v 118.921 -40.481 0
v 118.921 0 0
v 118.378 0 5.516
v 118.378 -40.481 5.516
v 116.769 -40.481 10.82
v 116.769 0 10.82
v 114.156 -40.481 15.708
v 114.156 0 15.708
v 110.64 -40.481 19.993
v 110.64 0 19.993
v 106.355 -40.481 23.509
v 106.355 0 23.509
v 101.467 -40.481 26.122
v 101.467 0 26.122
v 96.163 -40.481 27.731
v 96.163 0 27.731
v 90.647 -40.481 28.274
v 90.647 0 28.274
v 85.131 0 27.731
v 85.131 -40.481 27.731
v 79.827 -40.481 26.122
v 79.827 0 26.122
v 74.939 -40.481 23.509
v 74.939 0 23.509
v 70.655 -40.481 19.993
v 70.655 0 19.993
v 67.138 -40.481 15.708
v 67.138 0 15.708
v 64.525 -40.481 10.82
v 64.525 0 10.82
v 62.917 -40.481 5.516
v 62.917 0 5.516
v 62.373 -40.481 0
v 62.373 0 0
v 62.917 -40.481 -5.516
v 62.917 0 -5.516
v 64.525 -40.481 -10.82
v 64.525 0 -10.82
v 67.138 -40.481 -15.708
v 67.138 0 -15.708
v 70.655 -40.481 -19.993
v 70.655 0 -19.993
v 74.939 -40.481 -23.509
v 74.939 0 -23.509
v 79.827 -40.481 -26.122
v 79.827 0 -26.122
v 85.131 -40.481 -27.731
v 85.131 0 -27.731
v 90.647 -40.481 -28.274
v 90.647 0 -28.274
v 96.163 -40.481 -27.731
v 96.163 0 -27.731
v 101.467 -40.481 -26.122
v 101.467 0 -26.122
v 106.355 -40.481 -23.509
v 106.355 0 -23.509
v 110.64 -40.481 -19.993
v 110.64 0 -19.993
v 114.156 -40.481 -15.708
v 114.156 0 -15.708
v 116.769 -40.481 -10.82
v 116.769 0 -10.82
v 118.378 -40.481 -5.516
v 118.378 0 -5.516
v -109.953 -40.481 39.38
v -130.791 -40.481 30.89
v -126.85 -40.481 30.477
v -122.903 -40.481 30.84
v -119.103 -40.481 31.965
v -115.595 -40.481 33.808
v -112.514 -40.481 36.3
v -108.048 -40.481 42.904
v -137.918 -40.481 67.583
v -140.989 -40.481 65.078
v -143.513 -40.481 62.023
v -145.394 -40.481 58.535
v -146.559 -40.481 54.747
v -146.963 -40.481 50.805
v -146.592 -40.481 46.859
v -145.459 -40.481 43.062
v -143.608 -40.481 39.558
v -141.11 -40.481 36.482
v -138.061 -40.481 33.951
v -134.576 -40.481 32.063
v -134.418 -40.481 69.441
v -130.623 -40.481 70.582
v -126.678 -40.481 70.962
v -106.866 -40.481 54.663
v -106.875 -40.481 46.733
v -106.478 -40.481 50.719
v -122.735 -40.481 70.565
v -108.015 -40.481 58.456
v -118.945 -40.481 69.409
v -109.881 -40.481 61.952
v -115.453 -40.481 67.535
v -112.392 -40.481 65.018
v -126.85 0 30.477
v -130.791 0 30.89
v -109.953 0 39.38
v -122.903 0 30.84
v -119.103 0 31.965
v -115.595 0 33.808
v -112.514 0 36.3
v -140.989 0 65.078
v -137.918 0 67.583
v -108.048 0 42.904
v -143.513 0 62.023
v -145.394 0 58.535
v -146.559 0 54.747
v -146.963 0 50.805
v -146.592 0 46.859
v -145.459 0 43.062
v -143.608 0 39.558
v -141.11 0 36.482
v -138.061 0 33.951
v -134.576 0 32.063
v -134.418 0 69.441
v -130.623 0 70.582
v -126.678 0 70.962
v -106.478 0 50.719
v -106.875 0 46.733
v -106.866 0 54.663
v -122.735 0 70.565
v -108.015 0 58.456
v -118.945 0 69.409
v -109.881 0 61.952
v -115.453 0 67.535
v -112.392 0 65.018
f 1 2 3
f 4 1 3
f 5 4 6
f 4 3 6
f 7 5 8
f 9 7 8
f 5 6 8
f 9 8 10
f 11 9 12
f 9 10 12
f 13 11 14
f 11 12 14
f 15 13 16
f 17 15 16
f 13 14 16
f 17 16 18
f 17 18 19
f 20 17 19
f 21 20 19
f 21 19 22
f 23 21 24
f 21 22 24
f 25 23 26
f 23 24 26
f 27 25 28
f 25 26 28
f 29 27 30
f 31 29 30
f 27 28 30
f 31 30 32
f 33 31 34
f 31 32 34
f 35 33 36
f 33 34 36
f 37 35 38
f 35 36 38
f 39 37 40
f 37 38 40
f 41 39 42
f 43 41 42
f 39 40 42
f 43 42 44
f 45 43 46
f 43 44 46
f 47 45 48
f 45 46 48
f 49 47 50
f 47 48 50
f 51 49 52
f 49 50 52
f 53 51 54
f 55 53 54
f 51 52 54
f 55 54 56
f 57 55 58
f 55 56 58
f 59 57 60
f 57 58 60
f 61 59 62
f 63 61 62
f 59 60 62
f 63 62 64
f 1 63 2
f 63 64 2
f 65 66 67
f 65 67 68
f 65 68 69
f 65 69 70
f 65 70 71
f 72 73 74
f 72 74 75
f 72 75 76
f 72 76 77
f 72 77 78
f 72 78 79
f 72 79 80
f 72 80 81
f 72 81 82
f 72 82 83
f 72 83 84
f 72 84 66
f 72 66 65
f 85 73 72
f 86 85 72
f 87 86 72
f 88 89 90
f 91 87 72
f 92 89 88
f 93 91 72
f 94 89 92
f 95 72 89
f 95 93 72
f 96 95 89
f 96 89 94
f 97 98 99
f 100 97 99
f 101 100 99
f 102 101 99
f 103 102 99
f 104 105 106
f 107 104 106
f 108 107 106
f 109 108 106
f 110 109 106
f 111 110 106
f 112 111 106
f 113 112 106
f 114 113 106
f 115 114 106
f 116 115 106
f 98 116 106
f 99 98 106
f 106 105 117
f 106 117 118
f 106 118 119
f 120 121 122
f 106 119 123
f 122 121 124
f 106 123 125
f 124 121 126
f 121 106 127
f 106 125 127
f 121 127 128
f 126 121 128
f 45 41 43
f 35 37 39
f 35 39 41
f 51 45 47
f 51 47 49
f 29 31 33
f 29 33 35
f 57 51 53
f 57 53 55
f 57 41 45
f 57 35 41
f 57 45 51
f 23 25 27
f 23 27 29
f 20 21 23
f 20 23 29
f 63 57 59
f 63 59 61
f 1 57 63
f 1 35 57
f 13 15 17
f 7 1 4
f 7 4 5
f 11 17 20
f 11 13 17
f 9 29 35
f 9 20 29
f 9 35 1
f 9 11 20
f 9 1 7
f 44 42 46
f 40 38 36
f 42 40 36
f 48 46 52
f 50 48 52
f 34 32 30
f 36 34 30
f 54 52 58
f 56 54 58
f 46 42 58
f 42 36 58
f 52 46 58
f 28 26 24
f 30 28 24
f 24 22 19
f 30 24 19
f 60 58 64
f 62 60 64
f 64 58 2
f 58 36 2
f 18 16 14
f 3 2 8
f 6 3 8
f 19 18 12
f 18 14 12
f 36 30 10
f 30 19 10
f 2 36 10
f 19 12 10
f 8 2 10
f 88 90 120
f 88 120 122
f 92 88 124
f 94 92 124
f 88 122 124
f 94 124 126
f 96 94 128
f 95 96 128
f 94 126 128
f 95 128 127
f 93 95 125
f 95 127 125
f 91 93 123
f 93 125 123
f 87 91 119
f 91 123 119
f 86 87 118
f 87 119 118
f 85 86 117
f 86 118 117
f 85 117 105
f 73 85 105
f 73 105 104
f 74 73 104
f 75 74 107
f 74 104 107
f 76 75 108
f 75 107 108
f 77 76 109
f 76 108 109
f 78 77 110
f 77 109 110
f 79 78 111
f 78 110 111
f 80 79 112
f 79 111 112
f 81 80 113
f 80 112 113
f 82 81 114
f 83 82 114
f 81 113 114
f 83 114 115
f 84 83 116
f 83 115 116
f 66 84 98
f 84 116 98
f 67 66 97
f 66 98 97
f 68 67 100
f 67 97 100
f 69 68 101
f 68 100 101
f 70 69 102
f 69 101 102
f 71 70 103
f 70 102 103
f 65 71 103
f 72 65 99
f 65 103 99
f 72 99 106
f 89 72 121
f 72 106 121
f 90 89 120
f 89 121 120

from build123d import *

# Parameters (mm, degrees)
F0_R     = 28.273901
F1_DEPTH = 40.48078


with BuildPart() as f1:
    # F0 (on Front) → F1 (new body)
    with BuildSketch(Plane.XZ):
        with BuildLine():
            ThreePointArc((-106.47849, 50.71925), (-145.39389, 58.534968), (-112.513842, 36.299945))
            ThreePointArc((-112.513842, 36.299945), (-108.048189, 42.903532), (-106.47849, 50.71925))
        make_face()
        with Locations((90.647176, 0)):
            Circle(F0_R)
    extrude(amount=F1_DEPTH)


solid = f1.part
